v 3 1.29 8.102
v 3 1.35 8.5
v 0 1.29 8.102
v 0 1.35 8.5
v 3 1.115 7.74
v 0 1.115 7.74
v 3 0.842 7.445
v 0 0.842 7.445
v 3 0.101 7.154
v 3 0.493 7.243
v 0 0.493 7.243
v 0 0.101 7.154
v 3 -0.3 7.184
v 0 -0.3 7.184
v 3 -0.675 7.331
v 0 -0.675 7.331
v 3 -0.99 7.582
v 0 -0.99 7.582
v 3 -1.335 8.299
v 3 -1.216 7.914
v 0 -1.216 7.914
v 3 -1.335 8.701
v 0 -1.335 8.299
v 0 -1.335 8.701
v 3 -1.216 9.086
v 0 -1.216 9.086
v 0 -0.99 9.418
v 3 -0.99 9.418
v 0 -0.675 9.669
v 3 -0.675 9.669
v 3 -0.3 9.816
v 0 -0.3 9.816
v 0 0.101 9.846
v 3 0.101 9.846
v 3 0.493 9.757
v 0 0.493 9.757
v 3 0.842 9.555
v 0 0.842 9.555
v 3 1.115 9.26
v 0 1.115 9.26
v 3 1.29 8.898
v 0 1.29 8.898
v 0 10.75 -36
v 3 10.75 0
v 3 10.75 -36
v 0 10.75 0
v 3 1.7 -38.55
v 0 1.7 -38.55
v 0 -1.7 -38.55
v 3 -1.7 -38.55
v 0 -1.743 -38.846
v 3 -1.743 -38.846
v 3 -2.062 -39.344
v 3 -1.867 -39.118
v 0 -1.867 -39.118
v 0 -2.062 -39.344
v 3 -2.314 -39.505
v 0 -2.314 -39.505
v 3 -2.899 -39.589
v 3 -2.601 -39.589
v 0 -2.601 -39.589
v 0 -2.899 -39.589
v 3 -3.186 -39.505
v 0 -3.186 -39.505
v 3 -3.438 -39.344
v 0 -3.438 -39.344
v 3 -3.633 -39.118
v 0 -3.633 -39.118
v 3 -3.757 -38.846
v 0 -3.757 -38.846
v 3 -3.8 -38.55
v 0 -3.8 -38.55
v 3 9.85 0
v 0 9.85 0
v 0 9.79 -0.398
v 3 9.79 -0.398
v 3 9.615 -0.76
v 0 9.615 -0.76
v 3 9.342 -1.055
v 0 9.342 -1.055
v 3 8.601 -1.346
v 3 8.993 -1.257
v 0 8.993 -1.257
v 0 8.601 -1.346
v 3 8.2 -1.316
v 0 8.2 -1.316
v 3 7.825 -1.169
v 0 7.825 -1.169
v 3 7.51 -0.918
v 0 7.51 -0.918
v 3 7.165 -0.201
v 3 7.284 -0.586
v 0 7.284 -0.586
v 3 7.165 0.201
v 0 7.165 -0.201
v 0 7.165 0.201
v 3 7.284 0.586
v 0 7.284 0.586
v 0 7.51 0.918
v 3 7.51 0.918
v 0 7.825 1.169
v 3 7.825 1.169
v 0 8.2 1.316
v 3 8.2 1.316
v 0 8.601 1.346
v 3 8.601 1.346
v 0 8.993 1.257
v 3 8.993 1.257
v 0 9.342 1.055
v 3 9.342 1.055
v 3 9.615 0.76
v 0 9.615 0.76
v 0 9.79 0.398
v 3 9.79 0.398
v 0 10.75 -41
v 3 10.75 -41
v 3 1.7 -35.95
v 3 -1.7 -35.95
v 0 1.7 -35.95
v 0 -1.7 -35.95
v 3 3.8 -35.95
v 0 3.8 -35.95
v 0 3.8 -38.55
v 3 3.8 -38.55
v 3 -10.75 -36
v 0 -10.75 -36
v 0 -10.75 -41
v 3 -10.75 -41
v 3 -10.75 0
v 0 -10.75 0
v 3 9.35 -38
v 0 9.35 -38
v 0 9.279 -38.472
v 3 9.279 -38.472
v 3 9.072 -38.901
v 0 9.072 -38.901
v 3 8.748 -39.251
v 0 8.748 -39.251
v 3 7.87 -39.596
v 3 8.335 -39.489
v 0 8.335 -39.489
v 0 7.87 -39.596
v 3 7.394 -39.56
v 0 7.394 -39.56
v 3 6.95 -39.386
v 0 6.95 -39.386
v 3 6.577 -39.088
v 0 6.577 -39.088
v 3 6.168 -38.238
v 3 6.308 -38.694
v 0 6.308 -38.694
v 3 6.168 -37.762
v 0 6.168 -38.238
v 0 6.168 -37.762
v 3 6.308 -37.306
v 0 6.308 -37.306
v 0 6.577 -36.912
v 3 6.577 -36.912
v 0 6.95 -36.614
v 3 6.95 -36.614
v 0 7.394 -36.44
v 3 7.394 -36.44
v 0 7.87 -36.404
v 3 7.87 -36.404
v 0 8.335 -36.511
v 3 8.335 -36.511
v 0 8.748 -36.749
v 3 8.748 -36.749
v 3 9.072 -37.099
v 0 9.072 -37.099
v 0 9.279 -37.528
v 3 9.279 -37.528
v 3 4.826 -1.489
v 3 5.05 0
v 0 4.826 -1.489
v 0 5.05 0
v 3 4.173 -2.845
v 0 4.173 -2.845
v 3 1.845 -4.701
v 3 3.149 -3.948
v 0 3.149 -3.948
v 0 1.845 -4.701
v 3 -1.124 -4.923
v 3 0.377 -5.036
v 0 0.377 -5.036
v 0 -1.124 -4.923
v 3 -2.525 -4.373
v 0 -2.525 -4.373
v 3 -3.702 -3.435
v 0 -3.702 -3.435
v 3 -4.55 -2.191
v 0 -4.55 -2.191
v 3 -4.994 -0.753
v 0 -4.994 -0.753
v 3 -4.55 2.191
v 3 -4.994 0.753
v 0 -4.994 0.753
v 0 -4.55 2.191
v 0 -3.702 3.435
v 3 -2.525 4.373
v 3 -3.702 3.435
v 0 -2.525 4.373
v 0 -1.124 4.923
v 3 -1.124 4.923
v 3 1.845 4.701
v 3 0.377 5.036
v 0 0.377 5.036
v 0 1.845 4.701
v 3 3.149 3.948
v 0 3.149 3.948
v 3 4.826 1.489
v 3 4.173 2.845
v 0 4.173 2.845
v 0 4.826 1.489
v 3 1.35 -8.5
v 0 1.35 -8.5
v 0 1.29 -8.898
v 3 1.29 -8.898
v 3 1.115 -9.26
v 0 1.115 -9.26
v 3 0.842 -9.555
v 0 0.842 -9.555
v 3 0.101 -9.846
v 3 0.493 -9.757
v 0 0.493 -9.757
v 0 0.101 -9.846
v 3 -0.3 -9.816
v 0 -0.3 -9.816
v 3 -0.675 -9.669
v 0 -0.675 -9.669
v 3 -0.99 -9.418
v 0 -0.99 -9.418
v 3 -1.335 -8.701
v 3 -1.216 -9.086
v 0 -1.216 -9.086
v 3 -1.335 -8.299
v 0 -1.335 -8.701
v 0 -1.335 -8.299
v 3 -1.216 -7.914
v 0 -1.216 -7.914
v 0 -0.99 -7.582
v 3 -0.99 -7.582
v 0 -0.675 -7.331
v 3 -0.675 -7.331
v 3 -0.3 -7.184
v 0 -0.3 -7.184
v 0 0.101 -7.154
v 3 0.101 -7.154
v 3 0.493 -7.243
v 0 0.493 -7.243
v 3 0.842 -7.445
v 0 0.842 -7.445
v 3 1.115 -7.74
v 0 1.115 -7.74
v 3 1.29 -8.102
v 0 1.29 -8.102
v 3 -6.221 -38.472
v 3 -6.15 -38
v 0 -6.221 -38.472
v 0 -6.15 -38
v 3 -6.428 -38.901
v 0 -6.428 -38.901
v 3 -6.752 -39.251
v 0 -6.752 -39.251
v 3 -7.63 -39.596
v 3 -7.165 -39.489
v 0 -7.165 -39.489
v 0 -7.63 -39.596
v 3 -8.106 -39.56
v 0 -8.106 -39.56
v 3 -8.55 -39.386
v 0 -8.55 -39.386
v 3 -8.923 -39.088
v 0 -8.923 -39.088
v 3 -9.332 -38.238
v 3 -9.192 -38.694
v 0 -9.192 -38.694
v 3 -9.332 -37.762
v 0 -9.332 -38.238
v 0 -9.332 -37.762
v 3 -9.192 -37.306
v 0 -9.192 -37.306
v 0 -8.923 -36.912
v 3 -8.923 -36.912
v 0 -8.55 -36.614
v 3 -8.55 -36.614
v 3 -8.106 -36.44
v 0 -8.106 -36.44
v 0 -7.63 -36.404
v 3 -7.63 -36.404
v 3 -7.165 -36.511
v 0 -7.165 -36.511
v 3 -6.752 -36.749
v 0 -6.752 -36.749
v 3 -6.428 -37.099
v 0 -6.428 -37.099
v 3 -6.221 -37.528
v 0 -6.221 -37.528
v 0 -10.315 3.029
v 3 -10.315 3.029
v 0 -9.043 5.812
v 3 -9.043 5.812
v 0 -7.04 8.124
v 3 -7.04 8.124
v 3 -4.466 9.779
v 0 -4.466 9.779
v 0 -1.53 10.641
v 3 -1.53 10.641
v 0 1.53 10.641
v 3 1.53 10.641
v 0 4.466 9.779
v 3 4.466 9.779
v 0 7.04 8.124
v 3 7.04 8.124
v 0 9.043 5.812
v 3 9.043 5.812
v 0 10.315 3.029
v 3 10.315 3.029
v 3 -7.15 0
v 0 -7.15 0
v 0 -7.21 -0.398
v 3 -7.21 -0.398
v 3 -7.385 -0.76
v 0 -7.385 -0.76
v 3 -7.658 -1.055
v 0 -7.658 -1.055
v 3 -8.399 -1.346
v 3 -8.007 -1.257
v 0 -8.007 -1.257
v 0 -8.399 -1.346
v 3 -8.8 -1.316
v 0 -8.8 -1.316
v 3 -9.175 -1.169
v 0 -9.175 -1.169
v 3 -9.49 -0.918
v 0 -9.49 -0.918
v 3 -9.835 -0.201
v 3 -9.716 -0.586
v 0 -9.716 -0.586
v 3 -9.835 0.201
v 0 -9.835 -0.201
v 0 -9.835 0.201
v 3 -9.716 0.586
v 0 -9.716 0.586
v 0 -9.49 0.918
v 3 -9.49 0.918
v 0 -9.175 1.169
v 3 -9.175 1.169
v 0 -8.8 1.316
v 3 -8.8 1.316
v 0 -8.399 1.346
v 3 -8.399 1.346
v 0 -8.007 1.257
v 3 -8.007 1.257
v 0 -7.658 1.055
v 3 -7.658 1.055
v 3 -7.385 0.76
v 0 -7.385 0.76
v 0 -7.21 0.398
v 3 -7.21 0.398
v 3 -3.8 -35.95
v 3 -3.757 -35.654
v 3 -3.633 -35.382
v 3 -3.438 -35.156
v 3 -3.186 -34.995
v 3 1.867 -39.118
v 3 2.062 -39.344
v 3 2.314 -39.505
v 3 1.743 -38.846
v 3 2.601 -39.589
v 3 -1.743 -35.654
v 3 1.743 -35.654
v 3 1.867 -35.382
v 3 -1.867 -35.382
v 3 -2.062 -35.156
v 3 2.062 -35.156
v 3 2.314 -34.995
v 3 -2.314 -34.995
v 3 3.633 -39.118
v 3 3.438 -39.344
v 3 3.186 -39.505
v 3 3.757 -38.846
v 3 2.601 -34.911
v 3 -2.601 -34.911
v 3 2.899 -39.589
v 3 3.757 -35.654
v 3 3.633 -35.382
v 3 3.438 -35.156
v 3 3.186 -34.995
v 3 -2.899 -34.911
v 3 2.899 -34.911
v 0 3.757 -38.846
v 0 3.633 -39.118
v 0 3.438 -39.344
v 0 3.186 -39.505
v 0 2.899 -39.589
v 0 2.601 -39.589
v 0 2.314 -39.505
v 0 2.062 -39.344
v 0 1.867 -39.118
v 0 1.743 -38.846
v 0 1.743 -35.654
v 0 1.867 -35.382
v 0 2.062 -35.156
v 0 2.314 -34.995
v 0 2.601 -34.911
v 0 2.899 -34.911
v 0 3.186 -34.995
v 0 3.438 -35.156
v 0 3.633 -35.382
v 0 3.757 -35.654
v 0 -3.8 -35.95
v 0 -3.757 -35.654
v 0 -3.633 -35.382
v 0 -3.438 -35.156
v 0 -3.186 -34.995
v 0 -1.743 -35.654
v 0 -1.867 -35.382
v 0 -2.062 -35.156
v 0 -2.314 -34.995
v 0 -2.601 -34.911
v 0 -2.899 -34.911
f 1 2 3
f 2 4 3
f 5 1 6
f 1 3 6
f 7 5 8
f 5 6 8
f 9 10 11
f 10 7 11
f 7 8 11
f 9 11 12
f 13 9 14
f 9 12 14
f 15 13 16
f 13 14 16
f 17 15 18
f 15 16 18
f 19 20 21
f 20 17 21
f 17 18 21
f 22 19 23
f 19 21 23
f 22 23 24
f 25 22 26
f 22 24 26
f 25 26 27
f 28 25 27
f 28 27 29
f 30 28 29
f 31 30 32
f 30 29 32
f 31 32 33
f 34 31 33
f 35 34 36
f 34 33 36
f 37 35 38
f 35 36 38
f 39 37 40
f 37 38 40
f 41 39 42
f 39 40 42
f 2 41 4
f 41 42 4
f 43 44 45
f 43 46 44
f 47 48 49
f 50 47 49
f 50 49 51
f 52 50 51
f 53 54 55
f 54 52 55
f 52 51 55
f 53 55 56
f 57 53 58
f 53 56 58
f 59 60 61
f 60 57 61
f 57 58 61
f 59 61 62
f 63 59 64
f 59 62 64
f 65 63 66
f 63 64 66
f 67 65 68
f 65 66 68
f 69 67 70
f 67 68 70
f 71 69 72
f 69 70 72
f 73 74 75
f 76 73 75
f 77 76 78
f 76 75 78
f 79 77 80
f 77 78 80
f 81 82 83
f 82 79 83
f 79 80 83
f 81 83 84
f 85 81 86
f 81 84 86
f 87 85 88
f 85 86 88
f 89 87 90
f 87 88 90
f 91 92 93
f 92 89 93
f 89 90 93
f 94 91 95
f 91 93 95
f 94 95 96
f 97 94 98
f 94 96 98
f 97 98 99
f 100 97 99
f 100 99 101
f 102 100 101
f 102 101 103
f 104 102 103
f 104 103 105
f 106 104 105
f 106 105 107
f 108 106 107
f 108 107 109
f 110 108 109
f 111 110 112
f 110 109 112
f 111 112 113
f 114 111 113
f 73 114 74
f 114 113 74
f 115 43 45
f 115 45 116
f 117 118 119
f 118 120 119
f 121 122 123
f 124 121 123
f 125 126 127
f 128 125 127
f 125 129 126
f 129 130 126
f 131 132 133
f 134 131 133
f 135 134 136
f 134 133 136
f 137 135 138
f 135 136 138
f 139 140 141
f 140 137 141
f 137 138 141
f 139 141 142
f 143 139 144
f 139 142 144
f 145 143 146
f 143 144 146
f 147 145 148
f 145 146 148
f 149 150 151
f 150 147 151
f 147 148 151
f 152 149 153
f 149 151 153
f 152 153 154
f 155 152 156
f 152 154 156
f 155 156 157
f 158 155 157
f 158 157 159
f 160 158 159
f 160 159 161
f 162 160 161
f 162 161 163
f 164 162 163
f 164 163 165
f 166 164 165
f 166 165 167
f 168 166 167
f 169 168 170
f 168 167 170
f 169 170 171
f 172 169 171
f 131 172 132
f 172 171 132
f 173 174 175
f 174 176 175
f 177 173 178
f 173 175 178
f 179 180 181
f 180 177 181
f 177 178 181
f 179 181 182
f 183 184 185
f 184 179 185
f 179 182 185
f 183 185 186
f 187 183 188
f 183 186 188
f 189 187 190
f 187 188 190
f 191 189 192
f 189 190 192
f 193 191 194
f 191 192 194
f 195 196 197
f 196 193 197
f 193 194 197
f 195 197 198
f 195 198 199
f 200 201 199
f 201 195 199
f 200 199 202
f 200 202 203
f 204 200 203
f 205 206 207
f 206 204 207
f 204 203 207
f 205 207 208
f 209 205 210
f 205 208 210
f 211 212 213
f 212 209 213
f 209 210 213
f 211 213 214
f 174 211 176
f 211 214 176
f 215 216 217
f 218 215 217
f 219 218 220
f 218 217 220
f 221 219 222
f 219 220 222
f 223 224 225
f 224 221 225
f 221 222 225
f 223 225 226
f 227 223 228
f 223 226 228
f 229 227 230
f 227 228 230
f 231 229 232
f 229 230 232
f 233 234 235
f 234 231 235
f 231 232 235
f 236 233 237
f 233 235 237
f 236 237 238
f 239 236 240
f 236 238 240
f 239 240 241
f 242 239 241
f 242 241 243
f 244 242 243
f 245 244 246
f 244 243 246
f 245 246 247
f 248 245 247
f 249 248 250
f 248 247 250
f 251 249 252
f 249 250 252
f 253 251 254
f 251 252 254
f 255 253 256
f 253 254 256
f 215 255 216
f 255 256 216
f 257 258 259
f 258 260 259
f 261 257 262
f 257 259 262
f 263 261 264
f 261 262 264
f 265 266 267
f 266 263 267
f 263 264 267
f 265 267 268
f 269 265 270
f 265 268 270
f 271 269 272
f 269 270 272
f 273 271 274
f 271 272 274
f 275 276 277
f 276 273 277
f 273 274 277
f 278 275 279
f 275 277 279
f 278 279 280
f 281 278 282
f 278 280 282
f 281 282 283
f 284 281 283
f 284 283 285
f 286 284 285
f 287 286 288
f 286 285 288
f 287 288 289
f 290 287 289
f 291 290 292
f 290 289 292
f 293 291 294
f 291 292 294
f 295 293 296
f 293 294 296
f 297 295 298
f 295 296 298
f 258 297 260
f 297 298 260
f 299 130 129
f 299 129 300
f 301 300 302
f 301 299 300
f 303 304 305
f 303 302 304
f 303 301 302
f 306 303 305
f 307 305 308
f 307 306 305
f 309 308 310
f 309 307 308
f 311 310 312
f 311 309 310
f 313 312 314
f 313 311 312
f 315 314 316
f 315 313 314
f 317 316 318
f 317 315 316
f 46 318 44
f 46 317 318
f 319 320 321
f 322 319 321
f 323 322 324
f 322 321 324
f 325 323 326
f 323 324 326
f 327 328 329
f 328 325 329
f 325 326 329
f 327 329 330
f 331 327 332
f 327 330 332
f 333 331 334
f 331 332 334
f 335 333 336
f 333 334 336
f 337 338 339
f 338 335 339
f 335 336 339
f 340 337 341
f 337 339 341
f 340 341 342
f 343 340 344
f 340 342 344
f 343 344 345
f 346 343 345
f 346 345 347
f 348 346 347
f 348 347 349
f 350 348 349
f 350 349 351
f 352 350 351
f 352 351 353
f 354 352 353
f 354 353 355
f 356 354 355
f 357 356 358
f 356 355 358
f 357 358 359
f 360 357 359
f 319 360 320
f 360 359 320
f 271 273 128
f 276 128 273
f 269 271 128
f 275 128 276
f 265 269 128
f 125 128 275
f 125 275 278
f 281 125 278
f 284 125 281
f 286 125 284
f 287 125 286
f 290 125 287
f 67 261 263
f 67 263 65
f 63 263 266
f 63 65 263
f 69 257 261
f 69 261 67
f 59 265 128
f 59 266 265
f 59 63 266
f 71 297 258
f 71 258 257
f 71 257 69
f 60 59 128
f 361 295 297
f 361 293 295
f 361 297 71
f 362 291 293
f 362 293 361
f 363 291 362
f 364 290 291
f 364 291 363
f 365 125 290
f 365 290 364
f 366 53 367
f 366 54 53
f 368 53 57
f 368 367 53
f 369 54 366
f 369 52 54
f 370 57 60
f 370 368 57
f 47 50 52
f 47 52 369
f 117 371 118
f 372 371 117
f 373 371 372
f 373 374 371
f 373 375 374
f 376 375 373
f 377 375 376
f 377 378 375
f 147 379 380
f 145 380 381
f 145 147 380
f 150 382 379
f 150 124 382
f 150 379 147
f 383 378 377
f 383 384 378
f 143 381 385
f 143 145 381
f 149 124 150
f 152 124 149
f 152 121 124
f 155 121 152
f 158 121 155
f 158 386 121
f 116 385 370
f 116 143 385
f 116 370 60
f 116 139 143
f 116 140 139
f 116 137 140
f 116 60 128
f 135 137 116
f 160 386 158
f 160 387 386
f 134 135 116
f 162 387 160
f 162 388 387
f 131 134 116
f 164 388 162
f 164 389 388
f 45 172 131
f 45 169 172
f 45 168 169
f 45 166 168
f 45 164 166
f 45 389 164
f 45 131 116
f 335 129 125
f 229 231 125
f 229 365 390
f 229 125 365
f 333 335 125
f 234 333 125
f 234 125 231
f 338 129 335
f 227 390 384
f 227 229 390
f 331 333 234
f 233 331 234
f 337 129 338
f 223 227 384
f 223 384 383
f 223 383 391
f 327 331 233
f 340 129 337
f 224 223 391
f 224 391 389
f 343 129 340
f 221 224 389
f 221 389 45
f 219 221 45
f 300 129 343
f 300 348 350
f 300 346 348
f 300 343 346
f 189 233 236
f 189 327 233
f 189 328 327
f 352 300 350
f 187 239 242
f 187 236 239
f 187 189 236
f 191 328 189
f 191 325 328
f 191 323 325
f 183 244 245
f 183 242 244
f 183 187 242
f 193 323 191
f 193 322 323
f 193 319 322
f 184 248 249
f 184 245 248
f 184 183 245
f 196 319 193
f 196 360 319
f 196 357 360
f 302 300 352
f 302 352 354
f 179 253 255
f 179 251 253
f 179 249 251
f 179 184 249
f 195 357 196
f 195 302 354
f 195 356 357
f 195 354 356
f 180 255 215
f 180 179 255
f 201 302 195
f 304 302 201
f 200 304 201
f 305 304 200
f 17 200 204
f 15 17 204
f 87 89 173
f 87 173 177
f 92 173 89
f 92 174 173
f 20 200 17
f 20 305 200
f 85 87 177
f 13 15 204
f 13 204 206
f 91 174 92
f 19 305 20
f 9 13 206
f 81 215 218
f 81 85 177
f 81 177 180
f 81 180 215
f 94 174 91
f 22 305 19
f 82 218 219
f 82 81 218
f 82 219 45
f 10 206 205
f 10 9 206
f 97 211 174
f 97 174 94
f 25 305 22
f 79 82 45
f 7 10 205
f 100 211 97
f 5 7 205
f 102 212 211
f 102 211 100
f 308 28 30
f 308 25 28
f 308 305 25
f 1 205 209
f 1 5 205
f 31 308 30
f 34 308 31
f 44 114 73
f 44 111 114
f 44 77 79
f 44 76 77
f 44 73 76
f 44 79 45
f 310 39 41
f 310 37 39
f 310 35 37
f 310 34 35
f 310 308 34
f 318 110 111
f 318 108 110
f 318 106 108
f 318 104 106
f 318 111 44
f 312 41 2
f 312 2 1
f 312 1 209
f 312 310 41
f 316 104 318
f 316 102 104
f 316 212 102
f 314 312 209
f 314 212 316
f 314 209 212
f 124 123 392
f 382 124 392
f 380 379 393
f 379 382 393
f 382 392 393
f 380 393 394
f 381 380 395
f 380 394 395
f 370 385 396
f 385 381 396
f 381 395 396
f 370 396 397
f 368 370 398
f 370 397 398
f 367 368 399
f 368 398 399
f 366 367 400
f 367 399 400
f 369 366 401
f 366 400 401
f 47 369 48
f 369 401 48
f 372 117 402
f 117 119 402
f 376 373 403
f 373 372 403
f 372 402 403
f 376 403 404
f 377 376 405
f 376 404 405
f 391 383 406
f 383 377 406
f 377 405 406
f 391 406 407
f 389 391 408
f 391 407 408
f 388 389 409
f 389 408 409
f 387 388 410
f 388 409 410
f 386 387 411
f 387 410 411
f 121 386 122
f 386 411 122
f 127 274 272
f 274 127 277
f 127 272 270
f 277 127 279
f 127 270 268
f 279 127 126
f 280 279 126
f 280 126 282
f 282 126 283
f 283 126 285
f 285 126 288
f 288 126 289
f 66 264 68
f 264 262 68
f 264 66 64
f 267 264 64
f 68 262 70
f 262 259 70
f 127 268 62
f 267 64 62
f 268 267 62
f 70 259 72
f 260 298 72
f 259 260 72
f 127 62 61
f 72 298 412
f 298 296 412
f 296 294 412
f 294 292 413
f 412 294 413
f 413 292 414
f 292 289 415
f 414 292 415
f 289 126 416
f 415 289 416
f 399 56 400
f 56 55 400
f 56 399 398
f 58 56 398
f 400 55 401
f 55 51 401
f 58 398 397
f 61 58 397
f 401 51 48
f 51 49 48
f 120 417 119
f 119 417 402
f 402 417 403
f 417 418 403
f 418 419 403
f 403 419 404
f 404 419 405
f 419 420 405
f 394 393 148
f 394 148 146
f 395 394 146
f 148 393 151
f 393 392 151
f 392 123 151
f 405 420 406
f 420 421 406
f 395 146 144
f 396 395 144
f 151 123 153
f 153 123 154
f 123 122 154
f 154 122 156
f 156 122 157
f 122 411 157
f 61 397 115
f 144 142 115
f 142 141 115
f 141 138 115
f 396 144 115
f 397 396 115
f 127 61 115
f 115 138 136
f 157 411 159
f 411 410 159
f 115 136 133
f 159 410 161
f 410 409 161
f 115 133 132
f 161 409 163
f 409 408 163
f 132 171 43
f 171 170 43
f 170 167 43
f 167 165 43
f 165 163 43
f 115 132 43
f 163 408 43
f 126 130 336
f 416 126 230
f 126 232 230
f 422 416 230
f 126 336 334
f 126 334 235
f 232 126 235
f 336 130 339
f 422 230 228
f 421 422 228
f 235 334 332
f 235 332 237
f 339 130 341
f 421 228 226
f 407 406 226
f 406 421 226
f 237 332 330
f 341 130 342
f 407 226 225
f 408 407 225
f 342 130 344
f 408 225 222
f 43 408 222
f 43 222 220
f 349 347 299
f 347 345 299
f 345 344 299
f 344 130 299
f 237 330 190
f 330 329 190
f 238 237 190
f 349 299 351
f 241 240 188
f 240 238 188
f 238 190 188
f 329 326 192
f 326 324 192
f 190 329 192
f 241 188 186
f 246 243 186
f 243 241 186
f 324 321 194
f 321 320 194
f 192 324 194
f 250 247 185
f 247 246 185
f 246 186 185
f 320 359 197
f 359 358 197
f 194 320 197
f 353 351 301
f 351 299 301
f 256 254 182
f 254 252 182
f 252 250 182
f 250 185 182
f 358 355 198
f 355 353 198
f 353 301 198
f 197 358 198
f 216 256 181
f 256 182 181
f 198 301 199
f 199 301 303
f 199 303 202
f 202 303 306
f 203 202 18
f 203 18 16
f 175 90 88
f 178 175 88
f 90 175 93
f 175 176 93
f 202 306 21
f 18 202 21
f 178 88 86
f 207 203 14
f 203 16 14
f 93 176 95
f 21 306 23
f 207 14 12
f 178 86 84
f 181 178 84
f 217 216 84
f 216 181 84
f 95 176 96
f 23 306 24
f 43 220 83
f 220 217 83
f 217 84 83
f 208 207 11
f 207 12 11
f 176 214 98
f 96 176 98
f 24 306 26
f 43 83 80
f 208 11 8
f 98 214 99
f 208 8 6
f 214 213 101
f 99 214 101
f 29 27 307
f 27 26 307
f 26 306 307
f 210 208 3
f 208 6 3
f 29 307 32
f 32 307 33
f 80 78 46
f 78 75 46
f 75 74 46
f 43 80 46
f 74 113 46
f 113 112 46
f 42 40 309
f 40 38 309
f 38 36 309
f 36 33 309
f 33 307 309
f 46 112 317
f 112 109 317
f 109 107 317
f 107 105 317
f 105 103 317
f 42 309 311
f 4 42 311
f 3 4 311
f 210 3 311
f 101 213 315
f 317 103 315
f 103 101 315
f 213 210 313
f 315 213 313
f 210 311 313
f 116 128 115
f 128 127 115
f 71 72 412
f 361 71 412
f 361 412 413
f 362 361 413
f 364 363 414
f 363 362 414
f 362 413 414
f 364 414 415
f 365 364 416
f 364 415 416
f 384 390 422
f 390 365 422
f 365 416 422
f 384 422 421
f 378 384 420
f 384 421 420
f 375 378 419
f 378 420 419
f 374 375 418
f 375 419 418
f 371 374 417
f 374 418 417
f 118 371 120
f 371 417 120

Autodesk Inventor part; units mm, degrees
ref_plane "YZ Plane" through (0, 0, 0) normal (1, 0, 0) x (0, 1, 0)
ref_plane "XZ Plane" through (0, 0, 0) normal (0, 1, 0) x (-1, 0, 0)
ref_plane "XY Plane" through (0, 0, 0) normal (0, 0, 1) x (1, 0, 0)
sketch "スケッチ1" plane through (0, 0, 0) normal (1, 0, 0) x (0, 1, 0)
  circle A0 centre (0, 0) radius 5.05
  line L0 (-10.75, 0) -> (10.75, 0) construction
  line L1 (0, 11.25) -> (0, -41) construction
  line L2 (-10.75, 0) -> (-10.75, -36)
  line L3 (-10.75, -36) -> (-10.75, -41)
  line L4 (-10.75, -41) -> (10.75, -41)
  circle A1 centre (0, 8.5) radius 1.35
  circle A2 centre (0, 8.5) radius 2.25 construction
  circle A3 centre (-8.5, 0) radius 1.35
  circle A4 centre (0, -8.5) radius 1.35
  circle A5 centre (8.5, 0) radius 1.35
  line L5 (3.75, -36) -> (-3.75, -36) construction
  line L6 (-3.75, -36) -> (-3.75, -38.5) construction
  line L7 (-3.75, -38.5) -> (3.75, -38.5) construction
  line L8 (3.75, -38.5) -> (3.75, -36) construction
  line L9 (3.75, -36) -> (-3.75, -38.5) construction
  line L10 (-3.75, -36) -> (3.75, -38.5) construction
  circle A6 centre (-7.75, -38) radius 1.6
  line L11 (-10.75, -38) -> (13.8581, -38) construction
  circle A7 centre (-7.75, -38) radius 2.75 construction
  line L12 (-3.8, -35.95) -> (3.8, -35.95)
  line L13 (3.8, -35.95) -> (3.8, -38.55)
  line L14 (3.8, -38.55) -> (-3.8, -38.55)
  line L15 (-3.8, -38.55) -> (-3.8, -35.95)
  line L16 (-3.8, -35.95) -> (3.8, -38.55) construction
  line L17 (3.8, -35.95) -> (-3.8, -38.55) construction
  arc A8 (-1.7, -35.95) -> (-3.8, -35.95) centre (-2.75, -35.95) ccw
  line L18 (-3.75, -37.25) -> (3.75, -37.25) construction
  arc A9 (-3.8, -38.55) -> (-1.7, -38.55) centre (-2.75, -38.55) ccw
  line L19 (10.75, 0) -> (10.75, -36)
  line L20 (10.75, -36) -> (10.75, -41)
  circle A10 centre (7.75, -38) radius 1.6
  circle A11 centre (7.75, -38) radius 2.75 construction
  arc A12 (3.8, -35.95) -> (1.7, -35.95) centre (2.75, -35.95) ccw
  arc A13 (1.7, -38.55) -> (3.8, -38.55) centre (2.75, -38.55) ccw
  arc A14 (10.75, 0) -> (-10.75, 0) centre (0, 0) ccw
  line L21 (-13.5, 1) -> (13.5, 1) construction
  circle A15 centre (-13.5, 1) radius 2.25 construction
  point P0 (0, -37.25)
  point P1 (1.7, -38.55)
  point P2 (-1.7, -38.55)
  point P3 (0, 1)
  dimension "d0" = 10.1
  dimension "d1" = 5
  dimension "d2" = 41
  dimension "d4" = 2.7
  dimension "d5" = 8.5
  dimension "d6" = 4.5
  dimension "d9" = 360
  dimension "d11" = 7.5
  dimension "d12" = 2.5
  dimension "d13" = 3.2
  dimension "d14" = 5.5
  dimension "d15" = 3
  dimension "d16" = 0.05
  dimension "d17" = 0.05
  dimension "d18" = 1.05
  dimension "d19" = 15.5
  dimension "d22" = 27
  dimension "d23" = 1
  dimension "d25" = 4.5
  dimension "d26" = 21.5
extrude "押し出し1" add sketch "スケッチ1" along normal blind 3
equation "\"d17\" = d16"
properties part number "Foot_back_frame" material "アルミニウム 2014-T4"
